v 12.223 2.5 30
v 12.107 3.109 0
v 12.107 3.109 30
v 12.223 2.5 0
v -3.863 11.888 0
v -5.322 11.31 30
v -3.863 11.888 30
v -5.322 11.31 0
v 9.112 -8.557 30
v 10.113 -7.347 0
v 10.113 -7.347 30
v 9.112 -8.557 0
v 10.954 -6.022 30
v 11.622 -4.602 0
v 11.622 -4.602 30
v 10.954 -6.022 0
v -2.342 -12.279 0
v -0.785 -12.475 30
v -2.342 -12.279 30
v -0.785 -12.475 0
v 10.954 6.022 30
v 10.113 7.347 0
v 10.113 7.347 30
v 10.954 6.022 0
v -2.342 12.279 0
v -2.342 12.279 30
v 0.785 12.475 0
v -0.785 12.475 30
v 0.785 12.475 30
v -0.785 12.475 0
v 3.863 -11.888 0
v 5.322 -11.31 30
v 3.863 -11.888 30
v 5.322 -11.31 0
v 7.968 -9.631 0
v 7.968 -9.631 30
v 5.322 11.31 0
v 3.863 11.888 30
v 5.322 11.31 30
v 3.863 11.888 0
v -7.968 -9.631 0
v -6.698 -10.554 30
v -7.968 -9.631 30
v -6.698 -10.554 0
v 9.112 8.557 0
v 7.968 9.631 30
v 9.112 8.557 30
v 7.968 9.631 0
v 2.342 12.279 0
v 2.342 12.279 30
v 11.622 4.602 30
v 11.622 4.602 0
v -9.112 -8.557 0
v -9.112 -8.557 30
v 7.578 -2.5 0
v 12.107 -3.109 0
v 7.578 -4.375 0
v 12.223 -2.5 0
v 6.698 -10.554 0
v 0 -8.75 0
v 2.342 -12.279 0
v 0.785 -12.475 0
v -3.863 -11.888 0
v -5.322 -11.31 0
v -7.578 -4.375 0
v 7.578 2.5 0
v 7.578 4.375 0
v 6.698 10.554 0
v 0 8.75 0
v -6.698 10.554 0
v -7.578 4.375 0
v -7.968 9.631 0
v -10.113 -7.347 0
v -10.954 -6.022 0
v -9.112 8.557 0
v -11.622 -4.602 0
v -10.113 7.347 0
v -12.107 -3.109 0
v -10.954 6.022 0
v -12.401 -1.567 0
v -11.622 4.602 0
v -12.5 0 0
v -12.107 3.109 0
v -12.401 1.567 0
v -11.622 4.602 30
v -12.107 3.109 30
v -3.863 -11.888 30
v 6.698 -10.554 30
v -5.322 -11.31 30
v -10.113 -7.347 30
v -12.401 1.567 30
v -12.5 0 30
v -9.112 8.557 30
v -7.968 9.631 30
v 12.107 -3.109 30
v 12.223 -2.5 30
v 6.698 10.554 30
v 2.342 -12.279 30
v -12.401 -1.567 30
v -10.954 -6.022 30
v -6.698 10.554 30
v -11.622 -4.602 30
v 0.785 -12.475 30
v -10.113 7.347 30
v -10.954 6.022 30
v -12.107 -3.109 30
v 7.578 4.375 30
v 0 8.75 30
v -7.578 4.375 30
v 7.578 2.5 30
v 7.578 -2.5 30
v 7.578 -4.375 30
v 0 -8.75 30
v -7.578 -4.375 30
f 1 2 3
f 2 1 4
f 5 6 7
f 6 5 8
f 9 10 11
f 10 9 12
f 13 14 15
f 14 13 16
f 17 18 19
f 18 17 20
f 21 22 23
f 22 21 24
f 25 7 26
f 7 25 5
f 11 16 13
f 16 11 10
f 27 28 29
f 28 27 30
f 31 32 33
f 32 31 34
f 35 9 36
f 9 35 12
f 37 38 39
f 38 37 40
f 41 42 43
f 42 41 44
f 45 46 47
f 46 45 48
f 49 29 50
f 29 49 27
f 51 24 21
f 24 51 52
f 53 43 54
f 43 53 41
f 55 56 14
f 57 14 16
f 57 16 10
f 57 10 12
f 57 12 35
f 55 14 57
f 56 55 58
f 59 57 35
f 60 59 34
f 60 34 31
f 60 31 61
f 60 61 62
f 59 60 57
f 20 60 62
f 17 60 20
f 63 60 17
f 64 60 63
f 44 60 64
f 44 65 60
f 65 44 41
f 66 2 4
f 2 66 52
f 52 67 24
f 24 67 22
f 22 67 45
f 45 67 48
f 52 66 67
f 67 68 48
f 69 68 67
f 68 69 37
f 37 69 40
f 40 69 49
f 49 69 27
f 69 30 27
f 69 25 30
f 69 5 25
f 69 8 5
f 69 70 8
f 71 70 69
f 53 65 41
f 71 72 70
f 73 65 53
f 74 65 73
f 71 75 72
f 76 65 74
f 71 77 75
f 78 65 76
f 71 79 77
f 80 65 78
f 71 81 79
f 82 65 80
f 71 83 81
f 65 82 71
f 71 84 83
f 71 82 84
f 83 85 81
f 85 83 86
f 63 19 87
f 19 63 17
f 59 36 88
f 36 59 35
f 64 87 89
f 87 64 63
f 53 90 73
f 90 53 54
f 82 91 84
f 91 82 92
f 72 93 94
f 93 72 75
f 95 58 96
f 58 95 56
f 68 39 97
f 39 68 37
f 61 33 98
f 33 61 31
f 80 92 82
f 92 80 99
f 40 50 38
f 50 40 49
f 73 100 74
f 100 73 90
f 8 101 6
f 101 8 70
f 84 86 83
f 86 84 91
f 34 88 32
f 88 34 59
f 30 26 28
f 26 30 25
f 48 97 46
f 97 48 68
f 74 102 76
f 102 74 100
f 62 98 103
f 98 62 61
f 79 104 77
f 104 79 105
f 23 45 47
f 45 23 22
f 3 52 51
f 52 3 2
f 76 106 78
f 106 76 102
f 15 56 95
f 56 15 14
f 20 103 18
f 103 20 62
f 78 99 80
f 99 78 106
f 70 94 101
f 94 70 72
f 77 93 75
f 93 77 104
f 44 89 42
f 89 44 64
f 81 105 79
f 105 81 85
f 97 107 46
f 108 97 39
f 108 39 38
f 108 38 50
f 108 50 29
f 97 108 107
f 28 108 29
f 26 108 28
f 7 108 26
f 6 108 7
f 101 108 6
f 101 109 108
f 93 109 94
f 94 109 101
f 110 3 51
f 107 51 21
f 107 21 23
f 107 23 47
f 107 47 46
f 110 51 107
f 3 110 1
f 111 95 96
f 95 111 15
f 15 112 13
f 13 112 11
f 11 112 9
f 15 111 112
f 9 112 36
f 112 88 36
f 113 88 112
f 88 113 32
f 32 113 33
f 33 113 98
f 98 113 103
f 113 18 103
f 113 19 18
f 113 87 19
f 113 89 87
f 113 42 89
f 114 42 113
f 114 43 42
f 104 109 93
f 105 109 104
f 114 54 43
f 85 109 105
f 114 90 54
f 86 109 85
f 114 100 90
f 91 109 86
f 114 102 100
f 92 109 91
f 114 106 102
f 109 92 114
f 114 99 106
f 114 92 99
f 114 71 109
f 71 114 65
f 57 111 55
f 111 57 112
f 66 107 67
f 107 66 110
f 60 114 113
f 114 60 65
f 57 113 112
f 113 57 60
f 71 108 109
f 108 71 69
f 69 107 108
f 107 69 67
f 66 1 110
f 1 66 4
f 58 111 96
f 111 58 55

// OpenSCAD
$fn=50;

//A wrench to tighten buttons onto a panel, with hex nuts, and lots of wires.  Slip the wires through the slot, the wrench onto the nut, and tighten away


module general_poly(sides=6, height=10, radius=5, center=false) {
//sides = number of sides to the poly
//height = height of the linear extrude
//radius = distance from center point to vertex
//center = whether to center on Z axis
// Note: radius is related to sidelength...      
//    radius = (0.5*sidelength)/(sin(0.5*angle));
    angle = 360/sides;
    list = [ for (i=[0:angle:360]) [radius*cos(i),radius*sin(i)]];
    echo(list);
    linear_extrude(height=height, center=center) polygon(list);
}

//Overall height of the wrench
wrench_height=30;
//diameter from point-to-point of the nut
nut_diam=17.5;
//outside diameter of the wrench
wrench_diam=25;
slot_width=5;

difference() {
    cylinder(d=wrench_diam,h=wrench_height);
    rotate([0,0,30]) translate([0,0,-1]) general_poly(radius=nut_diam/2, height=wrench_height+2);
    #translate([0,-slot_width/2,-1]) cube([wrench_diam,slot_width,wrench_height+2]);
}
